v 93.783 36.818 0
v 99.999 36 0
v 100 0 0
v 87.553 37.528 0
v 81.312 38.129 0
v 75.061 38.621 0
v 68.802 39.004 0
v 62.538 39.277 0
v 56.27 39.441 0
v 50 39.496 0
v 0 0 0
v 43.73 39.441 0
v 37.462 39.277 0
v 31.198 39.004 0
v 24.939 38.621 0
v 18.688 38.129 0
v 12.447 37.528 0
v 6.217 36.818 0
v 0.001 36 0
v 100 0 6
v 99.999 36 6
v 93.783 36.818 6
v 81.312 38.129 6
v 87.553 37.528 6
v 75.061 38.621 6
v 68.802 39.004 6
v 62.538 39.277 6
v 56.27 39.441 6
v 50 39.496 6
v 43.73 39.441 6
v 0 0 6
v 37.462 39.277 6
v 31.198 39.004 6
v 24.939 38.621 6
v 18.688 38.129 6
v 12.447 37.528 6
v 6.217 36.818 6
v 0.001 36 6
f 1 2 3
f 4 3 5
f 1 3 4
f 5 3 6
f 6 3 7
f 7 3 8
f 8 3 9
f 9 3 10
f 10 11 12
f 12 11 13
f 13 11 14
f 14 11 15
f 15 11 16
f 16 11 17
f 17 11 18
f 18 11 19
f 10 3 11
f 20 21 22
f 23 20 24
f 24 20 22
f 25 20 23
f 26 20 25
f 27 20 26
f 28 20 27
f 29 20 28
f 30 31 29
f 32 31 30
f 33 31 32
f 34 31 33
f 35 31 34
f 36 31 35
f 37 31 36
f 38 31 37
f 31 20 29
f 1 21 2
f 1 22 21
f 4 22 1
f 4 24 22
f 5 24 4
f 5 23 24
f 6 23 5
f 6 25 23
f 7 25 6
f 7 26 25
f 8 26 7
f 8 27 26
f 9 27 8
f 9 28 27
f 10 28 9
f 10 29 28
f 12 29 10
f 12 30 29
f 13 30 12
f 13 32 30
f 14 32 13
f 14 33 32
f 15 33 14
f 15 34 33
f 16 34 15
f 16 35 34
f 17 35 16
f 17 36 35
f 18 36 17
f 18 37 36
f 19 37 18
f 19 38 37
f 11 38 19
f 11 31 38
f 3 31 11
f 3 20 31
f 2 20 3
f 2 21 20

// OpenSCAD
$fn = 32;

// ----------------------------------------------------------------------
// Arc profile plate: crown, 19 points
// ----------------------------------------------------------------------

// --- parameters (mm) ---
bar_l = 100;              // bar length, X
bar_w = 36;               // bar height at the ends, Y
arc_r = 359.26;           // radius of the crown arc
arc_angle = 16;           // crown arc angle, degrees
crown_rise = 3.5;         // rise of the crown over the ends
arc_step = 1;             // sampling step of the crown arc, degrees
plate_t = 6;              // plate thickness, Z

bbox_y = bar_w + crown_rise;  // full height with the crown

profile = [[99.999, 36], [93.783, 36.818], [87.553, 37.528], [81.312, 38.129], [75.061, 38.621], [68.802, 39.004], [62.538, 39.277], [56.27, 39.441], [50, 39.496], [43.73, 39.441], [37.462, 39.277], [31.198, 39.004], [24.939, 38.621], [18.688, 38.129], [12.447, 37.528], [6.217, 36.818], [0.001, 36], [0, 0], [100, 0]];  // primary outline, 19 points, counter clockwise

// --- the one profile operation ---
linear_extrude(height = plate_t) polygon(points = profile);
